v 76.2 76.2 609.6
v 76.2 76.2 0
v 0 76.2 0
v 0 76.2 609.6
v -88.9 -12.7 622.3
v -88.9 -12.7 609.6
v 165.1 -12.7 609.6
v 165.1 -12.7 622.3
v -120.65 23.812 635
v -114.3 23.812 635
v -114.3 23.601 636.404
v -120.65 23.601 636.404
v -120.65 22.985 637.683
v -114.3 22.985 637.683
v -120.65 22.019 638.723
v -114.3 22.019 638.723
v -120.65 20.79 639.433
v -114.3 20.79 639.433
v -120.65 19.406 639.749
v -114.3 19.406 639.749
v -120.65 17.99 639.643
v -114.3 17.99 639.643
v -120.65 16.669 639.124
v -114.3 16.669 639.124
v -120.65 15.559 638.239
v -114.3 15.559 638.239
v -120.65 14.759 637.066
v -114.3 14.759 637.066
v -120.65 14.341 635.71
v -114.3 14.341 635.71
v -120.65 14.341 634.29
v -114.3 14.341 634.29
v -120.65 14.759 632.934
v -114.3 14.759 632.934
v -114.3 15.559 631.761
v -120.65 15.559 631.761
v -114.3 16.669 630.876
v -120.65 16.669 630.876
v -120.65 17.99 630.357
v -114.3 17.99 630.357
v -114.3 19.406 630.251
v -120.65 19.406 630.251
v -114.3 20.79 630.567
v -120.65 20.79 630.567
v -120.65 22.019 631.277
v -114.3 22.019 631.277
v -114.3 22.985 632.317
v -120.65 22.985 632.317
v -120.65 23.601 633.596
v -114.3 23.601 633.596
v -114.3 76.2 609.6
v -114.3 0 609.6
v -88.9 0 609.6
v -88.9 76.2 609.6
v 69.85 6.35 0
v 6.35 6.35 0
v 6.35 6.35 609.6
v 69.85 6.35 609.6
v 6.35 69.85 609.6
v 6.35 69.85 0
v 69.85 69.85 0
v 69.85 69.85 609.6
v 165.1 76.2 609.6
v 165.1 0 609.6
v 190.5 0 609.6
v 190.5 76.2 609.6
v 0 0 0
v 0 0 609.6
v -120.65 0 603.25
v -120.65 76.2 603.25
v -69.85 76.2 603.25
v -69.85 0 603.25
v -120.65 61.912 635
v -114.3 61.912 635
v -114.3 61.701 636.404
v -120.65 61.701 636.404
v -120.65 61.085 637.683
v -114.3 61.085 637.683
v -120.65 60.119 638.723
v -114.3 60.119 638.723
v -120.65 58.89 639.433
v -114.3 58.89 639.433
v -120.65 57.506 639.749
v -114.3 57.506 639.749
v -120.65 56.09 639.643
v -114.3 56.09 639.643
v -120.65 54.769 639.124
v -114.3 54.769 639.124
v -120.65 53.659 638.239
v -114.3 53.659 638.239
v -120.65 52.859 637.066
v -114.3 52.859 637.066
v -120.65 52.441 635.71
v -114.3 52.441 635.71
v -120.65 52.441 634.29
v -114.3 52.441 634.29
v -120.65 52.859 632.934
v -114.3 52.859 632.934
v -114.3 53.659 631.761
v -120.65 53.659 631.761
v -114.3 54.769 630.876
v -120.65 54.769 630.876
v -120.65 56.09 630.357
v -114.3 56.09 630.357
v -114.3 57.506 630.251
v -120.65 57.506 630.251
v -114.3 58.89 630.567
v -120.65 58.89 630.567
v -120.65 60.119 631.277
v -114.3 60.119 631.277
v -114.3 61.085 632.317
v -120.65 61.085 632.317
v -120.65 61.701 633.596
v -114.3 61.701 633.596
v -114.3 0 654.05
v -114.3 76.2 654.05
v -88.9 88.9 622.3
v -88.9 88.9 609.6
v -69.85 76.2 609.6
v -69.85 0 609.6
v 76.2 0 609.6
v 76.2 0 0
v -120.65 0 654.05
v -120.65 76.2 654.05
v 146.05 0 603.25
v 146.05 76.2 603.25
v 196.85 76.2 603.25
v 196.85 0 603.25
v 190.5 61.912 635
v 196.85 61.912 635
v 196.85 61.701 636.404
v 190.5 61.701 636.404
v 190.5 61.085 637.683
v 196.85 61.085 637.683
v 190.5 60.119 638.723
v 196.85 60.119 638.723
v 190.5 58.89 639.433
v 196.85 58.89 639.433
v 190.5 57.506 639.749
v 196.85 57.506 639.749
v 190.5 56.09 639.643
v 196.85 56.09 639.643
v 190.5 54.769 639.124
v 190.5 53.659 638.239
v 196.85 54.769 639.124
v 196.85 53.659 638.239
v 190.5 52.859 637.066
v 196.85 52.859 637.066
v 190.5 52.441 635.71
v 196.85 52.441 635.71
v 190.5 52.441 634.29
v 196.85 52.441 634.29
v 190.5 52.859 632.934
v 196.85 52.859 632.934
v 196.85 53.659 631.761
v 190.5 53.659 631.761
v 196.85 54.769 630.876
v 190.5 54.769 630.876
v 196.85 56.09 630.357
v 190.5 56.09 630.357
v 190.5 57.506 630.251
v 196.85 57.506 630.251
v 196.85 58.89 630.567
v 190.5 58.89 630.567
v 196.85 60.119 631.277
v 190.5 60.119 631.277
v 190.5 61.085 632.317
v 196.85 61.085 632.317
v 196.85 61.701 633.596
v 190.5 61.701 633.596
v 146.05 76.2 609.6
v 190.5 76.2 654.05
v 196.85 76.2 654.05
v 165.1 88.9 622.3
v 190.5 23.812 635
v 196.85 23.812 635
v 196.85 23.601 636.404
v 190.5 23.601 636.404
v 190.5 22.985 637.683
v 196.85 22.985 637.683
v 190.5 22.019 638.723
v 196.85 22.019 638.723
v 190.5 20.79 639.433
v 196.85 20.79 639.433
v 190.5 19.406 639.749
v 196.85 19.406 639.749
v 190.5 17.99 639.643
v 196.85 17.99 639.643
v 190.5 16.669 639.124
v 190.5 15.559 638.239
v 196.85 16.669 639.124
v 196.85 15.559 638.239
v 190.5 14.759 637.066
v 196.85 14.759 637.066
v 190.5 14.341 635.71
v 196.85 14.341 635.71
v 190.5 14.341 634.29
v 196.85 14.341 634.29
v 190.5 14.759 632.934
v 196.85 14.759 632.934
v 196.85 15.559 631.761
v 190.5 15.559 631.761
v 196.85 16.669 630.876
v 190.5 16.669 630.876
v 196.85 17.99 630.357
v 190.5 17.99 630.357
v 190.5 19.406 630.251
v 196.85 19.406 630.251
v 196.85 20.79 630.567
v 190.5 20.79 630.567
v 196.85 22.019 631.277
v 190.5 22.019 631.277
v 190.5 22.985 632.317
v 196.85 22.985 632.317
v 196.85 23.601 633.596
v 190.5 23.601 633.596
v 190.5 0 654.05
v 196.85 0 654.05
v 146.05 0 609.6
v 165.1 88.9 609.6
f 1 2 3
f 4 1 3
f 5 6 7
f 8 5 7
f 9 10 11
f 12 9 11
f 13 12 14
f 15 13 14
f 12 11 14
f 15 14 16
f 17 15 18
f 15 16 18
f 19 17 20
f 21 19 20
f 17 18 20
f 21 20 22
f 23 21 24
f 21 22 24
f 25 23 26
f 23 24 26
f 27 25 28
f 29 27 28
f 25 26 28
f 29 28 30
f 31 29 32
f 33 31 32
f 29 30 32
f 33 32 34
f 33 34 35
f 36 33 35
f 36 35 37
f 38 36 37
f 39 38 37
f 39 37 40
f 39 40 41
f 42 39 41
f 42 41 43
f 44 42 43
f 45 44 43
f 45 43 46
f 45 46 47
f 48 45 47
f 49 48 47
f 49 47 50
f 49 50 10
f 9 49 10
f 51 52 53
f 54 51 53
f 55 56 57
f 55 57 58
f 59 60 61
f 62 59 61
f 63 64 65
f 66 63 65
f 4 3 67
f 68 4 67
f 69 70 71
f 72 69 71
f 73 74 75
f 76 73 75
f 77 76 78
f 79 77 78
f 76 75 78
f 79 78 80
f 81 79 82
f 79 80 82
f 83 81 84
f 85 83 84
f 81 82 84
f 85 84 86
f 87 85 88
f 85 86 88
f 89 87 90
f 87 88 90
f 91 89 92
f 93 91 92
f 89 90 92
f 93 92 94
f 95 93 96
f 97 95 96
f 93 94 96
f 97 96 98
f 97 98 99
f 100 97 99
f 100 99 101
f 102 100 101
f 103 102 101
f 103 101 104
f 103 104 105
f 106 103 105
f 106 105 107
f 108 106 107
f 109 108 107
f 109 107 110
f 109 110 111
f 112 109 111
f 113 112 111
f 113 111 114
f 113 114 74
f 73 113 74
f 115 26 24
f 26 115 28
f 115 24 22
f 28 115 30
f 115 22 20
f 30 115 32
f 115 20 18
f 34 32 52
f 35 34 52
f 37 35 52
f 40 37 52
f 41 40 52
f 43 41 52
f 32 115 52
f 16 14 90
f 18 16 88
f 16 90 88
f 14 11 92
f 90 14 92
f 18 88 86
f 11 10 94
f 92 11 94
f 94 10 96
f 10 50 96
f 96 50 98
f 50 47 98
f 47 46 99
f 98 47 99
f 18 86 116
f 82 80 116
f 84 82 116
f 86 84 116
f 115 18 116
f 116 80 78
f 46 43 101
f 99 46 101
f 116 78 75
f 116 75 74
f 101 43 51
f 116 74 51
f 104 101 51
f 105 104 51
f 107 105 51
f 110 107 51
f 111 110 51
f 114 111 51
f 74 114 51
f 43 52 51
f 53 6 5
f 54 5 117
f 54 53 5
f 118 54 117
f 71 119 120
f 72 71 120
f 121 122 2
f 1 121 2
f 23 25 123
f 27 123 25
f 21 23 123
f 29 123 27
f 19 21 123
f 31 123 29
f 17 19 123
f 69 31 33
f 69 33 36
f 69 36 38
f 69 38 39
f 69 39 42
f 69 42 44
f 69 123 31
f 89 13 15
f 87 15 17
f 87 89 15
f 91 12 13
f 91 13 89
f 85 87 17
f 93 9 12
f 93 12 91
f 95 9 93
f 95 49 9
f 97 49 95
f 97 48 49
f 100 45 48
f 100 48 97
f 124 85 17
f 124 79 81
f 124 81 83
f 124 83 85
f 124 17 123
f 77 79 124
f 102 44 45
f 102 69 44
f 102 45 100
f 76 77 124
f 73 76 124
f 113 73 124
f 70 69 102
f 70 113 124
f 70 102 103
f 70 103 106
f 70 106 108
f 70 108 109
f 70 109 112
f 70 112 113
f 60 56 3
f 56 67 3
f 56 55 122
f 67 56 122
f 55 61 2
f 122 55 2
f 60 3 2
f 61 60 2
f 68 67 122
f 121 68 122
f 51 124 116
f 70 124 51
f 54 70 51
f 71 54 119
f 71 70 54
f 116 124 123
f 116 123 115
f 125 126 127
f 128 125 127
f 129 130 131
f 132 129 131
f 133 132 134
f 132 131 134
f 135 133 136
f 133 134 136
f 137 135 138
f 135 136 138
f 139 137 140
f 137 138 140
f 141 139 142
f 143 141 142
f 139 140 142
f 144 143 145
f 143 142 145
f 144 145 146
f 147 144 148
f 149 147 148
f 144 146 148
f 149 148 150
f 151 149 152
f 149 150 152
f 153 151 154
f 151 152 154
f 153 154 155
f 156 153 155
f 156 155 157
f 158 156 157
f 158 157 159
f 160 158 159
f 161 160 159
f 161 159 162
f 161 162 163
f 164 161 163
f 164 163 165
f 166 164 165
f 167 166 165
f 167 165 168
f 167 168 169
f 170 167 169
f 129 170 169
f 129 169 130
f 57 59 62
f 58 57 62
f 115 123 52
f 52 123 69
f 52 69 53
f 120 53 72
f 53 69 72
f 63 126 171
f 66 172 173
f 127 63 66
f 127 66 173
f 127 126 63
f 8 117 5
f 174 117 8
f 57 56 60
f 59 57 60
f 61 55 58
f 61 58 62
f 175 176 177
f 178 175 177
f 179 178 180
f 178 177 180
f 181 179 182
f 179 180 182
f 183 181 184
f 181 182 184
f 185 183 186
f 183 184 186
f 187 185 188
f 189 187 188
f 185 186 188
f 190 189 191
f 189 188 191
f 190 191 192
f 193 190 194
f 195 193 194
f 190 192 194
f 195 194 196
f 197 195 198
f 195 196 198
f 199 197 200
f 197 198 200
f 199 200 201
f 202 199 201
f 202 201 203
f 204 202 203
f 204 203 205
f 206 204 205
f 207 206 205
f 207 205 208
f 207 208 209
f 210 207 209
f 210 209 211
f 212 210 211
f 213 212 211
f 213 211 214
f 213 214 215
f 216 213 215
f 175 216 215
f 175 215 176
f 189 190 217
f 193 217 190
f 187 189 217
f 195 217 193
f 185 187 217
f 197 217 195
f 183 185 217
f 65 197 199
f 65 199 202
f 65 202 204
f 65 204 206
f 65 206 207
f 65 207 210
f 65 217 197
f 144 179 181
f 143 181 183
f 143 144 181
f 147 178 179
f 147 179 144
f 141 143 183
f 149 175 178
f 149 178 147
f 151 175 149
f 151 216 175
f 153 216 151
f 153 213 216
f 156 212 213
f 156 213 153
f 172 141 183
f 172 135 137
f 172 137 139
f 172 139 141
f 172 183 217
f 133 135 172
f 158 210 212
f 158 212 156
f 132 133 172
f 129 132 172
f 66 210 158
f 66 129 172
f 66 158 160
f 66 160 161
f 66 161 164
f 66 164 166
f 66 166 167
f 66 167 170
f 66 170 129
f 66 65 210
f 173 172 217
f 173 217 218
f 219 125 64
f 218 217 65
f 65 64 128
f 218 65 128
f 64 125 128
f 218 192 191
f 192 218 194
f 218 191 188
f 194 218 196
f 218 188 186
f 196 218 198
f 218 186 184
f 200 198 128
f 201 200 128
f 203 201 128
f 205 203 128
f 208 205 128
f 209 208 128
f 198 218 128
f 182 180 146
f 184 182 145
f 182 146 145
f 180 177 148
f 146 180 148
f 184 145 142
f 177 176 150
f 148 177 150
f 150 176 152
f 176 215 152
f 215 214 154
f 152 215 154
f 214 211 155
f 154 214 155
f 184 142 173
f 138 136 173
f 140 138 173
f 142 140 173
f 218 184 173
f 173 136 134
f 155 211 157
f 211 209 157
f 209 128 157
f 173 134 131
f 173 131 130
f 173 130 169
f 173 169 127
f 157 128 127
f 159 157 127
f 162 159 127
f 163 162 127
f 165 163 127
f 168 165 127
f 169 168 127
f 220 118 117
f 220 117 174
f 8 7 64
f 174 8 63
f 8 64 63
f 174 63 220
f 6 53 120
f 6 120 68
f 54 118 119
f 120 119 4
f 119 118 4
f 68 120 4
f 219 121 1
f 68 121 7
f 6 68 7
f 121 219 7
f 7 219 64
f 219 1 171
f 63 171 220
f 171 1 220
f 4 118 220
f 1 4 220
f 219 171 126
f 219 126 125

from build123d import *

# Parameters (mm, degrees)
F0_W      = 63.5
F0_H      = 63.5
F1_DEPTH  = 609.6
F2_W      = 254
F2_H      = 101.6
F3_DEPTH  = 12.7
F4_W      = 50.8
F4_H      = 76.2
F5_DEPTH  = 6.35
F6_W      = 6.35
F6_H      = 76.2
F7_DEPTH  = 44.45
F8_W      = 6.35
F8_H      = 76.2
F9_DEPTH  = 44.45
F10_R     = 4.7625
F11_DEPTH = 381


with BuildPart() as f1:
    # F0 (on Top) → F1 (new body)
    with BuildSketch(Plane.XY):
        Polygon((0, 76.2), (0, 0), (76.2, 0), (76.2, 76.2), (6.35, 76.2), (5.991533, 76.2), align=None)
        with Locations((38.1, 38.1)):
            Rectangle(F0_W, F0_H, mode=Mode.SUBTRACT)
    extrude(amount=F1_DEPTH)

    # F2 (on face) → F3 (join)
    with BuildSketch(Plane.XY.offset(609.6)):
        with Locations((38.1, 38.1)):
            Rectangle(F2_W, F2_H)
    extrude(amount=F3_DEPTH)

    # F4 (on face) → F5 (join)
    with BuildSketch(Plane(origin=(0, 0, 609.6), x_dir=(1, 0, 0), z_dir=(0, 0, -1))):
        Polygon((-69.85, 0), (-88.9, 0), (-120.65, 0), (-120.65, -76.2), (-69.85, -76.2), align=None)
        with Locations((171.45, -38.1)):
            Rectangle(F4_W, F4_H)
    extrude(amount=F5_DEPTH)

    # F6 (on face) → F7 (join)
    with BuildSketch(Plane.XY.offset(609.6)):
        with Locations((-117.475, 38.1)):
            Rectangle(F6_W, F6_H)
    extrude(amount=F7_DEPTH)

    # F8 (on face) → F9 (join)
    with BuildSketch(Plane.XY.offset(609.6)):
        with Locations((193.675, 38.1)):
            Rectangle(F8_W, F8_H)
    extrude(amount=F9_DEPTH)

    # F10 (on face) → F11 (cut)
    with BuildSketch(Plane.YZ.offset(196.85)):
        with Locations((19.05, 635)):
            Circle(F10_R)
        with Locations((57.15, 635)):
            Circle(F10_R)
    extrude(amount=-F11_DEPTH, mode=Mode.SUBTRACT)


solid = f1.part
